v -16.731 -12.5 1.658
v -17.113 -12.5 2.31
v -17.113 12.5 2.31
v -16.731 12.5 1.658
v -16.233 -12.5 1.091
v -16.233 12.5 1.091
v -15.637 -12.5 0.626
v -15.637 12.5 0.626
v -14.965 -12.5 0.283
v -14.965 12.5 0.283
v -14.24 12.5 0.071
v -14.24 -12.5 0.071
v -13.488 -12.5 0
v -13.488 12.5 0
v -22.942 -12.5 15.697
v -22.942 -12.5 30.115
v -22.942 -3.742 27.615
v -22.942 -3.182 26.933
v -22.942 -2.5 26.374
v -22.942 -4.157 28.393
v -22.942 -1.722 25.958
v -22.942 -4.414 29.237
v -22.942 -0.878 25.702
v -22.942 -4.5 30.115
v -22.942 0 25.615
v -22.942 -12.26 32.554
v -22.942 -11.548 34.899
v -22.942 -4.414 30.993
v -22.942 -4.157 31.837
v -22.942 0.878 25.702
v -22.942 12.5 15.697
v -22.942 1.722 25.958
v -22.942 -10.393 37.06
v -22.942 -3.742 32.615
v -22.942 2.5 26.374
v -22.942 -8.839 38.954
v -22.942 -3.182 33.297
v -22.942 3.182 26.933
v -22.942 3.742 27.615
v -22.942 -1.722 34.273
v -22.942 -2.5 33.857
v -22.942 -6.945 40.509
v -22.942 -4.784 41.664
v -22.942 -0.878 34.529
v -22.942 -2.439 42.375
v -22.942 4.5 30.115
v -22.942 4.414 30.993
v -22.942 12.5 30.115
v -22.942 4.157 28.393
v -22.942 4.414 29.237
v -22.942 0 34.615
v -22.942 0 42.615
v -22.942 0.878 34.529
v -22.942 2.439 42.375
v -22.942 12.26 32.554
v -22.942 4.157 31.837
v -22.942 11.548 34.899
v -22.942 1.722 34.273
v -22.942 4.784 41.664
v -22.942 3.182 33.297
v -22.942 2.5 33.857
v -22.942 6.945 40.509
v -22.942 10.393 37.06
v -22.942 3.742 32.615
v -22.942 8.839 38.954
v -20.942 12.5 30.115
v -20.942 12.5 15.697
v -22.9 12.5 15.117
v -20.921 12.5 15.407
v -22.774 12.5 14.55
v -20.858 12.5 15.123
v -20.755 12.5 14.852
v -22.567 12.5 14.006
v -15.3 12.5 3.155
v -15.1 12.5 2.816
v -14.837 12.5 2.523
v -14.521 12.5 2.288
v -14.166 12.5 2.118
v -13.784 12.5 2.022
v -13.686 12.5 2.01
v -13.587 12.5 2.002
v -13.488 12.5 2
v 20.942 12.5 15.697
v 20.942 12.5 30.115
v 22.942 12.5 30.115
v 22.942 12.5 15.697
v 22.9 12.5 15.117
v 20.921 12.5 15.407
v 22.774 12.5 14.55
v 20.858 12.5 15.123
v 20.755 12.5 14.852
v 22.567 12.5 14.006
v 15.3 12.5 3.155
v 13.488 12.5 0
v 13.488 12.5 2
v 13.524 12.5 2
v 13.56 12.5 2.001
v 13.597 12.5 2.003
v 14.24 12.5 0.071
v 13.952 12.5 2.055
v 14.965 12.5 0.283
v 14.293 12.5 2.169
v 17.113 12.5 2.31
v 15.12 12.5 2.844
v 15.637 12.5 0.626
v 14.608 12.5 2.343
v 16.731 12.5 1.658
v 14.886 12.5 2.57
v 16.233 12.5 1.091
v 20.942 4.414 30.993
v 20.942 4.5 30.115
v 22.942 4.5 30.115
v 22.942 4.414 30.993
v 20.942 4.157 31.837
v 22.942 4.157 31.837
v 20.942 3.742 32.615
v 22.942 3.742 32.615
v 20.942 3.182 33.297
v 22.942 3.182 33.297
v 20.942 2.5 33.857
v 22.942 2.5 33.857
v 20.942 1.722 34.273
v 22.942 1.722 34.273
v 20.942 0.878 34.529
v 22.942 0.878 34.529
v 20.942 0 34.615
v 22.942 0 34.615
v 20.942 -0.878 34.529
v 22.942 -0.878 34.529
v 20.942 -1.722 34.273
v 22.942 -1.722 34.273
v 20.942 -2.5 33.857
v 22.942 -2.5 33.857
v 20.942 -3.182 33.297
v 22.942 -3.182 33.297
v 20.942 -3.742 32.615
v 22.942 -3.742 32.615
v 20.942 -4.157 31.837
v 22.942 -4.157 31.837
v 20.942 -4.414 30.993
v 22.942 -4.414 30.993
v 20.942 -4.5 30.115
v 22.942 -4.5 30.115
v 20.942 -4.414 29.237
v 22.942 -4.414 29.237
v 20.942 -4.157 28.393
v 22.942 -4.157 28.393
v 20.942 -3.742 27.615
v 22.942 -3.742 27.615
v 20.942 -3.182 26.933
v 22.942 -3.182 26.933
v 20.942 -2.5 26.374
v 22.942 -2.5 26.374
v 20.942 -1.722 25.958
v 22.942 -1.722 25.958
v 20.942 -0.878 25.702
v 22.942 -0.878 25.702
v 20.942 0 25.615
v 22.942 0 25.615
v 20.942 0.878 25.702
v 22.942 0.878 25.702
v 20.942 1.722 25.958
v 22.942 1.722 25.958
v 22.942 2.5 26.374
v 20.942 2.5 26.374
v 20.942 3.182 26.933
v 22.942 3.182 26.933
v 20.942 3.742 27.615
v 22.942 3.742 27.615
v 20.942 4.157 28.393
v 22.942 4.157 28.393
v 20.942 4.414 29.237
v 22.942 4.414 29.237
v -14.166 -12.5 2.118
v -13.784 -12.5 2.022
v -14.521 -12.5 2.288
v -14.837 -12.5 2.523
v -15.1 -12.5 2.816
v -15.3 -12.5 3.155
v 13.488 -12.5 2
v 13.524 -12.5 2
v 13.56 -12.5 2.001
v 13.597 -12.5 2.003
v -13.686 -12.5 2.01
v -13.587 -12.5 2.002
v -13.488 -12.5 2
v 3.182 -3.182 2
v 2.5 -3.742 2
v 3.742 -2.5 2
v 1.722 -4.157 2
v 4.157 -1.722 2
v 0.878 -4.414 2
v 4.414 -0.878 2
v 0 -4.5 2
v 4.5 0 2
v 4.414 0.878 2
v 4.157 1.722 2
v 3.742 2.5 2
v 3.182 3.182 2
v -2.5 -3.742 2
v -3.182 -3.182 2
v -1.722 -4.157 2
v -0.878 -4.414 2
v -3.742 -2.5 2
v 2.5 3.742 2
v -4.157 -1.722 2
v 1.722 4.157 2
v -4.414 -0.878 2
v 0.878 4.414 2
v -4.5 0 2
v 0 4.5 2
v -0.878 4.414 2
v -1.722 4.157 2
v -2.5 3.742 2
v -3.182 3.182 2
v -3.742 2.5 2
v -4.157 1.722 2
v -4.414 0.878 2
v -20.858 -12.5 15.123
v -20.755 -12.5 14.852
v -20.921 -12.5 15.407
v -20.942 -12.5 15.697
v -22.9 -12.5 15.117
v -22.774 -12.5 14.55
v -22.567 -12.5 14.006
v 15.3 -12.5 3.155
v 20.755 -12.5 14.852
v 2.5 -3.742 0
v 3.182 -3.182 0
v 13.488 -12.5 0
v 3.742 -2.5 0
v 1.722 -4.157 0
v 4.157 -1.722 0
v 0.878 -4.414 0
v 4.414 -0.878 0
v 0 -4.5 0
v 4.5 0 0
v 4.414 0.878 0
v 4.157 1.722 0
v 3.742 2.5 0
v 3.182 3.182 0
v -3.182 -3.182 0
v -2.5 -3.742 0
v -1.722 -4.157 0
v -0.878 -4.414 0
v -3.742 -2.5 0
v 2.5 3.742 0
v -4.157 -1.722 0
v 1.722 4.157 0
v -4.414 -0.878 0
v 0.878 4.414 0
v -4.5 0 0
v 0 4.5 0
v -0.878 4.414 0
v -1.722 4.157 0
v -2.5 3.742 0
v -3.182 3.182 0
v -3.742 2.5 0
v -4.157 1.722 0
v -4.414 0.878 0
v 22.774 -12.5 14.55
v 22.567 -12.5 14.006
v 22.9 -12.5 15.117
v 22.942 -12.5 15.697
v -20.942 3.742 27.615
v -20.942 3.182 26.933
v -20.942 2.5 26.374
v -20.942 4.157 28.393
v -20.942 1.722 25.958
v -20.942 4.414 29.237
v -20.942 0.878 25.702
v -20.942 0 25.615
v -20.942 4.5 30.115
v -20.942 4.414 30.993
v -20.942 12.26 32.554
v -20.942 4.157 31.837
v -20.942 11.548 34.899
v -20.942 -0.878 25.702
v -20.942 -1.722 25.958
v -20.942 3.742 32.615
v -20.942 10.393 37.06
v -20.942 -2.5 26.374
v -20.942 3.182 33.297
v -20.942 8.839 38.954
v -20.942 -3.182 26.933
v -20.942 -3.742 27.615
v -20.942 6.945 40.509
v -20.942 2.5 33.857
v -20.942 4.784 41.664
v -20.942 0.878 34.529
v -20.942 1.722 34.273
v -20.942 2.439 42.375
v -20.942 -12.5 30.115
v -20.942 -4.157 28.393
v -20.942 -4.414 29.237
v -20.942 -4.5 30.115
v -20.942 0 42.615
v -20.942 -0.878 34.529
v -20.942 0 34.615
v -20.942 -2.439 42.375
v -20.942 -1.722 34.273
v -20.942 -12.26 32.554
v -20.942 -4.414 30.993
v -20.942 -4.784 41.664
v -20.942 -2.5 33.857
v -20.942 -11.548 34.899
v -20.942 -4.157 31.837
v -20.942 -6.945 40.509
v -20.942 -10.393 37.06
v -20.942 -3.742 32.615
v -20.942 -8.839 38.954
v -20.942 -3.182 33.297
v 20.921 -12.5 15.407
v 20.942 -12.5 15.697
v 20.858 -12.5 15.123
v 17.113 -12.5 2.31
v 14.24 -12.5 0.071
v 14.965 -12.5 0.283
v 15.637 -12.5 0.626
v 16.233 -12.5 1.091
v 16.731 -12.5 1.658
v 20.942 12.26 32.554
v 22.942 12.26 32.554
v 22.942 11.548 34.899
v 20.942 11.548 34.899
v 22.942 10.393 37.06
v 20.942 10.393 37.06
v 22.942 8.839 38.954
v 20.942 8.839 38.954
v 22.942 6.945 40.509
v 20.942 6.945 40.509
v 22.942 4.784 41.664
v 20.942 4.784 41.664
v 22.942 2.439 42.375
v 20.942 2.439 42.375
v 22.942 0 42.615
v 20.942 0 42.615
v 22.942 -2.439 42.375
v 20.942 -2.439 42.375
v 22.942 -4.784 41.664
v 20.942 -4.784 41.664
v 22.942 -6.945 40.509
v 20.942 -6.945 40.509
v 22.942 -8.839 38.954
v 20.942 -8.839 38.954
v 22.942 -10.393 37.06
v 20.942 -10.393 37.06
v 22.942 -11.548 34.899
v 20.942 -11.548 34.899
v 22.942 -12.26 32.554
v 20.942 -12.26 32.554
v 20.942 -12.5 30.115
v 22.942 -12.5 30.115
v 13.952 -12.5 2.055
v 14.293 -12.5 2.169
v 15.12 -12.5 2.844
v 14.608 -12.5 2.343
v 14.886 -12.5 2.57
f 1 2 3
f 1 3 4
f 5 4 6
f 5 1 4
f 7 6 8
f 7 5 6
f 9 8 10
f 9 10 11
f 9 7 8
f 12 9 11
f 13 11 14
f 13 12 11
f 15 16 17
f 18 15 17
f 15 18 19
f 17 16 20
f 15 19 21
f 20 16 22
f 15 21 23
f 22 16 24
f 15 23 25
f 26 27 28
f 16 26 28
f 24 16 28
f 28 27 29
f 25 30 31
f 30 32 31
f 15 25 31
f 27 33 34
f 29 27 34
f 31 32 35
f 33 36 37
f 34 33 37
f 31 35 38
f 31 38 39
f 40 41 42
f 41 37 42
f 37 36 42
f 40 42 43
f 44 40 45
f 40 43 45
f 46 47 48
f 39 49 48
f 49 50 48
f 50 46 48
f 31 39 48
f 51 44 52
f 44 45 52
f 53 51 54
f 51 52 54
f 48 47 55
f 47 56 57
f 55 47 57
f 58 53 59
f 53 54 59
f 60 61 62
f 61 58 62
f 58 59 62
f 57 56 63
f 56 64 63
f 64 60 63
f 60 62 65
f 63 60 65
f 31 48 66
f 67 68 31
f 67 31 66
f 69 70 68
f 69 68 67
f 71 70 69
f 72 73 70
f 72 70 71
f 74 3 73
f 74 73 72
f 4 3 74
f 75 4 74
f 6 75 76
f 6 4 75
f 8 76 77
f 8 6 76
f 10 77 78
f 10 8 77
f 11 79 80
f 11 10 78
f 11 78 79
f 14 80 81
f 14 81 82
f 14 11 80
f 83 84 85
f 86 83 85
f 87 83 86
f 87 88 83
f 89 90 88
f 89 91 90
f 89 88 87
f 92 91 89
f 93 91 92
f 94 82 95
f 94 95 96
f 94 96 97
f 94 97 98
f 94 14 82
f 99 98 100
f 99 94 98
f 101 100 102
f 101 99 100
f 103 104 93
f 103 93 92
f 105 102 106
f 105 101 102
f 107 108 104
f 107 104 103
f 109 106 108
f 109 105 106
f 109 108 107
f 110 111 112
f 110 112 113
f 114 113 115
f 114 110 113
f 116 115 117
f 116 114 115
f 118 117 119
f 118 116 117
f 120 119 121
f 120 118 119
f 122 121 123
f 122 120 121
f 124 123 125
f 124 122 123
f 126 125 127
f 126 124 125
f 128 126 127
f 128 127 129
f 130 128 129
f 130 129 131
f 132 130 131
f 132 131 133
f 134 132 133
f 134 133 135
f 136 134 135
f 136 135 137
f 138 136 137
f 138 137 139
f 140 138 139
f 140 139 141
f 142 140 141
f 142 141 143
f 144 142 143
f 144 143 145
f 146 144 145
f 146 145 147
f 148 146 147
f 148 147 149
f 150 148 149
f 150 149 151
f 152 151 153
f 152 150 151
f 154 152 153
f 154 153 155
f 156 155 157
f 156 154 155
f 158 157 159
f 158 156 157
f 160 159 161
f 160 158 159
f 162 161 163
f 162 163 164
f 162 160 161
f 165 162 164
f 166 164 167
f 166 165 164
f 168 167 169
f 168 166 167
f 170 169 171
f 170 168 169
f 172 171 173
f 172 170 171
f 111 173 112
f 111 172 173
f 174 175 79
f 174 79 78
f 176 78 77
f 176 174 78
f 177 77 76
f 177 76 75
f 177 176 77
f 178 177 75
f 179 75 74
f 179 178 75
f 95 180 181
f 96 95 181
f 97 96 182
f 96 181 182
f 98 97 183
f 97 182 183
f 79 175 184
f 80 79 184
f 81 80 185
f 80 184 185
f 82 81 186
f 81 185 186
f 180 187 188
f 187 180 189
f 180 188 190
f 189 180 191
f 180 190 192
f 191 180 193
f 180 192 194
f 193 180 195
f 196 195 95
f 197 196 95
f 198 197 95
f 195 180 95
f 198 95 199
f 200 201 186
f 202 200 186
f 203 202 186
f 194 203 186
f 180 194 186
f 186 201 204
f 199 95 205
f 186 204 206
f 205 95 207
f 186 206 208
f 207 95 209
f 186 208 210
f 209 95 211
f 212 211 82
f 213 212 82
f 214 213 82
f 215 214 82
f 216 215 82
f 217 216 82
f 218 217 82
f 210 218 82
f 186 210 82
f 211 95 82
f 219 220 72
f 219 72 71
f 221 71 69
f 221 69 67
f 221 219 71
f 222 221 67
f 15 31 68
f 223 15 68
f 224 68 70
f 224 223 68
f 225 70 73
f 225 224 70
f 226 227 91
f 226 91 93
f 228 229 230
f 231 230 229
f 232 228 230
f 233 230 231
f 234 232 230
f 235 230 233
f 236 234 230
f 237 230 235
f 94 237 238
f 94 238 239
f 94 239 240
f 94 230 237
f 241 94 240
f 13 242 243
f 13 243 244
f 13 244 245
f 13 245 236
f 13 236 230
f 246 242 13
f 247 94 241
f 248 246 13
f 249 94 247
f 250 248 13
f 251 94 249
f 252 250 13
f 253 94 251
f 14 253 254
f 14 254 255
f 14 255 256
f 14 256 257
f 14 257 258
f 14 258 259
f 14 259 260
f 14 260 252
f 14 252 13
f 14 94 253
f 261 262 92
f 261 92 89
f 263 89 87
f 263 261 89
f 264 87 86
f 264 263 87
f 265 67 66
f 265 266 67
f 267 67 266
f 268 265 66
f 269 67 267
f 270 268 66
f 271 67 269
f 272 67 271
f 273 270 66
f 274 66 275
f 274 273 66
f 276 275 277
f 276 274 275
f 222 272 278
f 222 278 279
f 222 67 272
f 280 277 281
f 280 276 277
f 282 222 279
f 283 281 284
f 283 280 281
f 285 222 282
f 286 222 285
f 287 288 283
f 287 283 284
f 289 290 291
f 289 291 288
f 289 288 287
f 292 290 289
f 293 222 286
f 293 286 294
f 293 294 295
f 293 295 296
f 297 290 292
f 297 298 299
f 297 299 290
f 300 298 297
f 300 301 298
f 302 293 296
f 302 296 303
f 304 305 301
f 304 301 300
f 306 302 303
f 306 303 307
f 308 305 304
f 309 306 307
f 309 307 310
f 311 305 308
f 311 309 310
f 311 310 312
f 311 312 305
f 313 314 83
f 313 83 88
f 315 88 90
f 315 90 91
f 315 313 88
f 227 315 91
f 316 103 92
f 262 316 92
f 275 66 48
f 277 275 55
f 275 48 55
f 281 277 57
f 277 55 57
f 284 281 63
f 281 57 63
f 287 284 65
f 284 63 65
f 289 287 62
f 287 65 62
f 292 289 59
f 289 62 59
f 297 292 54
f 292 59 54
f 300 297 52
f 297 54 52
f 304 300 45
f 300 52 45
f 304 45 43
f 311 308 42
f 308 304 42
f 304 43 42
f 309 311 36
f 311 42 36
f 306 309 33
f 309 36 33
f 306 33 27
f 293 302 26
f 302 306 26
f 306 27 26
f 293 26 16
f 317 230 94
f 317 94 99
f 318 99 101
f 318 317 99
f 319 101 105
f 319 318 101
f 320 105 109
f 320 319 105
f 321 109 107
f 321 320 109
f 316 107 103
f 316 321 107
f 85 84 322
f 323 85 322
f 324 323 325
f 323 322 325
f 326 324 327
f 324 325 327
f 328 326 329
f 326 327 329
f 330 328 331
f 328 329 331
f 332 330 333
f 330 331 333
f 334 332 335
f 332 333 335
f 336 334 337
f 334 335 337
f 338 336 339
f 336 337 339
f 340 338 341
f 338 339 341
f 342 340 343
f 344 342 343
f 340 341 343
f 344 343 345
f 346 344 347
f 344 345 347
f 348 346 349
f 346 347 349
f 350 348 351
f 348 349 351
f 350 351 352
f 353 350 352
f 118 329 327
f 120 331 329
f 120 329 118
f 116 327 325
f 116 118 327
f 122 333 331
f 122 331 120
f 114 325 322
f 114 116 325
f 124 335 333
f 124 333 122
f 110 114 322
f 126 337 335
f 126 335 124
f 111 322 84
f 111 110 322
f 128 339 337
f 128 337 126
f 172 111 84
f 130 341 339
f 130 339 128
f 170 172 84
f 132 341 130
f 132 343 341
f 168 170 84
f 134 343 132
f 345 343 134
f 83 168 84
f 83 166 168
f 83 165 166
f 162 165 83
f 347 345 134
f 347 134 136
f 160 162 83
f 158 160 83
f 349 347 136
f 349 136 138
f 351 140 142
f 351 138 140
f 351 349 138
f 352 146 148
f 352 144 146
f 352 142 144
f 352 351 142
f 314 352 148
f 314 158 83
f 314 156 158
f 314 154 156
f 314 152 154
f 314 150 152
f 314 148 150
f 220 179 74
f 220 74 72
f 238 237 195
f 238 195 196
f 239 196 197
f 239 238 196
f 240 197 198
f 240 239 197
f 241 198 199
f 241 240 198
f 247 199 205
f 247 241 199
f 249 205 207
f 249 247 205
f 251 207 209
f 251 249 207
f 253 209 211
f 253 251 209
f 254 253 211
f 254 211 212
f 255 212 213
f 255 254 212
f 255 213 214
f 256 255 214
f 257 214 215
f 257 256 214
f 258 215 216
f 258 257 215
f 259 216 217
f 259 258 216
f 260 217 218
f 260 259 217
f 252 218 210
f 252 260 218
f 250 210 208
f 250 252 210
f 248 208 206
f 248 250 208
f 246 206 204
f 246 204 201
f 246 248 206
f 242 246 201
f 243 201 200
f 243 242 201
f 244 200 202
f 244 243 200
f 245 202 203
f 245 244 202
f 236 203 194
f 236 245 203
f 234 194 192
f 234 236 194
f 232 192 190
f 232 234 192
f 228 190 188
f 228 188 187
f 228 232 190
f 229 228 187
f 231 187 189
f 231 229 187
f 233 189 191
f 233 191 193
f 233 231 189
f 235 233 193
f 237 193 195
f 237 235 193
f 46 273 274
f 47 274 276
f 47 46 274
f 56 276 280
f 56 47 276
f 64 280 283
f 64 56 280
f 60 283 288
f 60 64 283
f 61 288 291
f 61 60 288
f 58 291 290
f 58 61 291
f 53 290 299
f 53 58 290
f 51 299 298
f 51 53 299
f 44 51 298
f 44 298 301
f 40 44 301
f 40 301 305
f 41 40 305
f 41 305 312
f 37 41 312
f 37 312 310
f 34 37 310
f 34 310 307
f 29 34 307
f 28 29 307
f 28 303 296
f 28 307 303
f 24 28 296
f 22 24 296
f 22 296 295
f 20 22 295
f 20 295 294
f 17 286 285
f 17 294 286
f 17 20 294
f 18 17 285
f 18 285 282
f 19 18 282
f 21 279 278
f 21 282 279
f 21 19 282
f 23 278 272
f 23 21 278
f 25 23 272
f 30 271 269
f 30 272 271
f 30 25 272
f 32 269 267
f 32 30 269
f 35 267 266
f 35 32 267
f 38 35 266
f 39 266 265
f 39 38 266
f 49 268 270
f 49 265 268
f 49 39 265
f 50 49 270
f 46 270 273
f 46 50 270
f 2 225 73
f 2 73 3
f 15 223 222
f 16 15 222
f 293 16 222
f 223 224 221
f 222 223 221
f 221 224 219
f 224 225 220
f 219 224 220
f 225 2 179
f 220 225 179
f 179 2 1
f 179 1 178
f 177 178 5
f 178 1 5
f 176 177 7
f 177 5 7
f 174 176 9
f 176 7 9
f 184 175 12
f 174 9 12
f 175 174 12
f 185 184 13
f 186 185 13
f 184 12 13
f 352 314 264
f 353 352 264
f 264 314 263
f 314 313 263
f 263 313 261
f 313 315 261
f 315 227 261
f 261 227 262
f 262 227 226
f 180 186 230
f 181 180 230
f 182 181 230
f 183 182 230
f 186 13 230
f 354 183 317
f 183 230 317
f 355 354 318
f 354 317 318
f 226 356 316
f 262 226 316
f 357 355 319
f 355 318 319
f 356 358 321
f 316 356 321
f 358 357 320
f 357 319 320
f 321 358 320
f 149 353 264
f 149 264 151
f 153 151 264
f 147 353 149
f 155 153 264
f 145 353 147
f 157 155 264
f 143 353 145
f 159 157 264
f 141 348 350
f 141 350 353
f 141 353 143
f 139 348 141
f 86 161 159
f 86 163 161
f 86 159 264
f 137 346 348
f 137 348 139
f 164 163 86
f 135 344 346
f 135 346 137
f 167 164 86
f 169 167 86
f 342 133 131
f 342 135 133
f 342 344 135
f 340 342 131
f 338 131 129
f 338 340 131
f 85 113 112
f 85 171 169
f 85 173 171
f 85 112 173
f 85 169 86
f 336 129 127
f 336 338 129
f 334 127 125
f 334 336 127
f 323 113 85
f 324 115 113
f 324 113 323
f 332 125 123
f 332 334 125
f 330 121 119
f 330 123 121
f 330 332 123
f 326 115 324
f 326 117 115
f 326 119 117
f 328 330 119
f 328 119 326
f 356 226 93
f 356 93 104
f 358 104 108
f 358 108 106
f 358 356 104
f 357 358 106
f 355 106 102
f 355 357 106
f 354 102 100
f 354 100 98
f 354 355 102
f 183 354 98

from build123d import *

# Parameters (mm, degrees)
SKETCH1_R                  = 4.5
EXTRUDE1_DEPTH             = 2
PROCESS_BENDS1_START       = -58
PROCESS_BENDS1_OUTLINE_W   = 25
PROCESS_BENDS1_OUTLINE_H   = 2
PROCESS_BENDS1_DEPTH       = 40.887009382
PROCESS_BENDS1_START_2     = 17.112990618
PROCESS_BENDS1_2_OUTLINE_W = 25
PROCESS_BENDS1_2_OUTLINE_H = 2
PROCESS_BENDS1_2_DEPTH     = 40.887009382
PROCESS_BENDS1_START_3     = 13.596613306
PROCESS_BENDS1_3_OUTLINE_R = 4.5
PROCESS_BENDS1_3_DEPTH     = 9.345511755
PROCESS_BENDS1_START_4     = -22.942125061
PROCESS_BENDS1_4_OUTLINE_R = 4.5
PROCESS_BENDS1_4_DEPTH     = 9.157953378
PROCESS_BENDS1_START_5     = -12.5
PROCESS_BENDS1_5_DEPTH     = 25
PROCESS_BENDS1_6_DEPTH     = 25


with BuildPart() as part:
    # Sketch1 → Extrude1 (new body)
    with BuildSketch(Plane.XY):
        with BuildLine():
            Line((-45, 12.5), (45, 12.5))
            ThreePointArc((45, 12.5), (57.5, 0), (45, -12.5))
            Line((45, -12.5), (-45, -12.5))
            ThreePointArc((-45, -12.5), (-57.5, 0), (-45, 12.5))
        make_face()
        with Locations((45, 0)):
            Circle(SKETCH1_R, mode=Mode.SUBTRACT)
        with Locations(Location((-45, 0, 0), (0, 0, 180))):
            Circle(SKETCH1_R, mode=Mode.SUBTRACT)
        Circle(SKETCH1_R, mode=Mode.SUBTRACT)
    extrude(amount=EXTRUDE1_DEPTH)

    # Process-Bends1: read off the stored shape, not the designer's step
    # Process-Bends1 outline → Process-Bends1 (cut)
    with BuildSketch(Plane.YZ.offset(PROCESS_BENDS1_START)):
        with Locations((0, 1)):
            Rectangle(PROCESS_BENDS1_OUTLINE_W, PROCESS_BENDS1_OUTLINE_H)
    extrude(amount=PROCESS_BENDS1_DEPTH, mode=Mode.SUBTRACT)

    # Process-Bends1 2 outline → Process-Bends1 2 (cut)
    with BuildSketch(Plane.YZ.offset(PROCESS_BENDS1_START_2)):
        with Locations((0, 1)):
            Rectangle(PROCESS_BENDS1_2_OUTLINE_W, PROCESS_BENDS1_2_OUTLINE_H)
    extrude(amount=PROCESS_BENDS1_2_DEPTH, mode=Mode.SUBTRACT)

    # Process-Bends1 3 outline → Process-Bends1 3 (add)
    with BuildSketch(Plane.YZ.offset(PROCESS_BENDS1_START_3)):
        with BuildLine():
            ThreePointArc((12.5, 30.115293784), (0, 42.615293784), (-12.5, 30.115293784))
            Line((-12.5, 30.115293784), (-12.5, 2))
            Line((-12.5, 2), (12.5, 2))
            Line((12.5, 2), (12.5, 30.115293784))
        make_face()
        with Locations((0, 30.115293784)):
            Circle(PROCESS_BENDS1_3_OUTLINE_R, mode=Mode.SUBTRACT)
    extrude(amount=PROCESS_BENDS1_3_DEPTH)

    # Process-Bends1 4 outline → Process-Bends1 4 (add)
    with BuildSketch(Plane.YZ.offset(PROCESS_BENDS1_START_4)):
        with BuildLine():
            ThreePointArc((12.5, 30.115293784), (0, 42.615293784), (-12.5, 30.115293784))
            Line((-12.5, 30.115293784), (-12.5, 2))
            Line((-12.5, 2), (12.5, 2))
            Line((12.5, 2), (12.5, 30.115293784))
        make_face()
        with Locations((0, 30.115293784)):
            Circle(PROCESS_BENDS1_4_OUTLINE_R, mode=Mode.SUBTRACT)
    extrude(amount=PROCESS_BENDS1_4_DEPTH)

    # Process-Bends1 5 outline → Process-Bends1 5 (cut)
    with BuildSketch(Plane(origin=(0, 0, 0), x_dir=(1, 0, 0), z_dir=(0, 1, 0)).offset(PROCESS_BENDS1_START_5)):
        with BuildLine():
            ThreePointArc((-20.754740635, -14.851688233), (-20.894717075, -15.264045529), (-20.942125061, -15.696924757))
            Line((-20.942125061, -15.696924757), (-20.942125061, -44))
            Line((-20.942125061, -44), (-13.784171683, -44))
            Line((-13.784171683, -44), (-13.784171683, -2.022087009))
            ThreePointArc((-13.784171683, -2.022087009), (-14.684730041, -2.397732403), (-15.300375044, -3.154763477))
            Line((-15.300375044, -3.154763477), (-20.754740635, -14.851688233))
        make_face()
        with BuildLine():
            Line((13.596613306, -2.002964486), (13.596613306, -44))
            Line((13.596613306, -44), (20.942125061, -44))
            Line((20.942125061, -44), (20.942125061, -15.696924757))
            ThreePointArc((20.942125061, -15.696924757), (20.894717075, -15.264045529), (20.754740635, -14.851688233))
            Line((20.754740635, -14.851688233), (15.300375044, -3.154763477))
            ThreePointArc((15.300375044, -3.154763477), (14.607880625, -2.343096684), (13.596613306, -2.002964486))
        make_face()
        with BuildLine():
            Line((-22.942125061, -2), (-22.942125061, -15.696924757))
            ThreePointArc((-22.942125061, -15.696924757), (-22.847309089, -14.831166301), (-22.567356209, -14.00645171))
            Line((-22.567356209, -14.00645171), (-17.112990618, -2.309526953))
            ThreePointArc((-17.112990618, -2.309526953), (-15.636957903, -0.626434217), (-13.48775947, 0))
            Line((-13.48775947, 0), (-17.112990618, 0))
            Line((-17.112990618, 0), (-17.112990618, -2))
            Line((-17.112990618, -2), (-22.942125061, -2))
        make_face()
        with BuildLine():
            Line((22.942125061, -2), (17.112990618, -2))
            Line((17.112990618, -2), (17.112990618, 0))
            Line((17.112990618, 0), (13.48775947, 0))
            ThreePointArc((13.48775947, 0), (15.636957903, -0.626434217), (17.112990618, -2.309526953))
            Line((17.112990618, -2.309526953), (22.567356209, -14.00645171))
            ThreePointArc((22.567356209, -14.00645171), (22.847309089, -14.831166301), (22.942125061, -15.696924757))
            Line((22.942125061, -15.696924757), (22.942125061, -2))
        make_face()
    extrude(amount=PROCESS_BENDS1_5_DEPTH, mode=Mode.SUBTRACT)

    # Process-Bends1 6 outline → Process-Bends1 6 (add)
    with BuildSketch(Plane(origin=(0, 0, 0), x_dir=(1, 0, 0), z_dir=(0, 1, 0)).offset(PROCESS_BENDS1_START_5)):
        with BuildLine():
            Line((-13.784171683, -2), (-13.784171683, -2.022087009))
            ThreePointArc((-13.784171683, -2.022087009), (-13.636376458, -2.005529396), (-13.48775947, -2))
            Line((-13.48775947, -2), (-13.784171683, -2))
        make_face()
        with BuildLine():
            Line((13.596613306, -2.000000001), (13.48775947, -2))
            ThreePointArc((13.48775947, -2), (13.542206568, -2.000741259), (13.596613306, -2.002964486))
            Line((13.596613306, -2.002964486), (13.596613306, -2.000000001))
        make_face()
    extrude(amount=PROCESS_BENDS1_6_DEPTH)


solid = part.part
